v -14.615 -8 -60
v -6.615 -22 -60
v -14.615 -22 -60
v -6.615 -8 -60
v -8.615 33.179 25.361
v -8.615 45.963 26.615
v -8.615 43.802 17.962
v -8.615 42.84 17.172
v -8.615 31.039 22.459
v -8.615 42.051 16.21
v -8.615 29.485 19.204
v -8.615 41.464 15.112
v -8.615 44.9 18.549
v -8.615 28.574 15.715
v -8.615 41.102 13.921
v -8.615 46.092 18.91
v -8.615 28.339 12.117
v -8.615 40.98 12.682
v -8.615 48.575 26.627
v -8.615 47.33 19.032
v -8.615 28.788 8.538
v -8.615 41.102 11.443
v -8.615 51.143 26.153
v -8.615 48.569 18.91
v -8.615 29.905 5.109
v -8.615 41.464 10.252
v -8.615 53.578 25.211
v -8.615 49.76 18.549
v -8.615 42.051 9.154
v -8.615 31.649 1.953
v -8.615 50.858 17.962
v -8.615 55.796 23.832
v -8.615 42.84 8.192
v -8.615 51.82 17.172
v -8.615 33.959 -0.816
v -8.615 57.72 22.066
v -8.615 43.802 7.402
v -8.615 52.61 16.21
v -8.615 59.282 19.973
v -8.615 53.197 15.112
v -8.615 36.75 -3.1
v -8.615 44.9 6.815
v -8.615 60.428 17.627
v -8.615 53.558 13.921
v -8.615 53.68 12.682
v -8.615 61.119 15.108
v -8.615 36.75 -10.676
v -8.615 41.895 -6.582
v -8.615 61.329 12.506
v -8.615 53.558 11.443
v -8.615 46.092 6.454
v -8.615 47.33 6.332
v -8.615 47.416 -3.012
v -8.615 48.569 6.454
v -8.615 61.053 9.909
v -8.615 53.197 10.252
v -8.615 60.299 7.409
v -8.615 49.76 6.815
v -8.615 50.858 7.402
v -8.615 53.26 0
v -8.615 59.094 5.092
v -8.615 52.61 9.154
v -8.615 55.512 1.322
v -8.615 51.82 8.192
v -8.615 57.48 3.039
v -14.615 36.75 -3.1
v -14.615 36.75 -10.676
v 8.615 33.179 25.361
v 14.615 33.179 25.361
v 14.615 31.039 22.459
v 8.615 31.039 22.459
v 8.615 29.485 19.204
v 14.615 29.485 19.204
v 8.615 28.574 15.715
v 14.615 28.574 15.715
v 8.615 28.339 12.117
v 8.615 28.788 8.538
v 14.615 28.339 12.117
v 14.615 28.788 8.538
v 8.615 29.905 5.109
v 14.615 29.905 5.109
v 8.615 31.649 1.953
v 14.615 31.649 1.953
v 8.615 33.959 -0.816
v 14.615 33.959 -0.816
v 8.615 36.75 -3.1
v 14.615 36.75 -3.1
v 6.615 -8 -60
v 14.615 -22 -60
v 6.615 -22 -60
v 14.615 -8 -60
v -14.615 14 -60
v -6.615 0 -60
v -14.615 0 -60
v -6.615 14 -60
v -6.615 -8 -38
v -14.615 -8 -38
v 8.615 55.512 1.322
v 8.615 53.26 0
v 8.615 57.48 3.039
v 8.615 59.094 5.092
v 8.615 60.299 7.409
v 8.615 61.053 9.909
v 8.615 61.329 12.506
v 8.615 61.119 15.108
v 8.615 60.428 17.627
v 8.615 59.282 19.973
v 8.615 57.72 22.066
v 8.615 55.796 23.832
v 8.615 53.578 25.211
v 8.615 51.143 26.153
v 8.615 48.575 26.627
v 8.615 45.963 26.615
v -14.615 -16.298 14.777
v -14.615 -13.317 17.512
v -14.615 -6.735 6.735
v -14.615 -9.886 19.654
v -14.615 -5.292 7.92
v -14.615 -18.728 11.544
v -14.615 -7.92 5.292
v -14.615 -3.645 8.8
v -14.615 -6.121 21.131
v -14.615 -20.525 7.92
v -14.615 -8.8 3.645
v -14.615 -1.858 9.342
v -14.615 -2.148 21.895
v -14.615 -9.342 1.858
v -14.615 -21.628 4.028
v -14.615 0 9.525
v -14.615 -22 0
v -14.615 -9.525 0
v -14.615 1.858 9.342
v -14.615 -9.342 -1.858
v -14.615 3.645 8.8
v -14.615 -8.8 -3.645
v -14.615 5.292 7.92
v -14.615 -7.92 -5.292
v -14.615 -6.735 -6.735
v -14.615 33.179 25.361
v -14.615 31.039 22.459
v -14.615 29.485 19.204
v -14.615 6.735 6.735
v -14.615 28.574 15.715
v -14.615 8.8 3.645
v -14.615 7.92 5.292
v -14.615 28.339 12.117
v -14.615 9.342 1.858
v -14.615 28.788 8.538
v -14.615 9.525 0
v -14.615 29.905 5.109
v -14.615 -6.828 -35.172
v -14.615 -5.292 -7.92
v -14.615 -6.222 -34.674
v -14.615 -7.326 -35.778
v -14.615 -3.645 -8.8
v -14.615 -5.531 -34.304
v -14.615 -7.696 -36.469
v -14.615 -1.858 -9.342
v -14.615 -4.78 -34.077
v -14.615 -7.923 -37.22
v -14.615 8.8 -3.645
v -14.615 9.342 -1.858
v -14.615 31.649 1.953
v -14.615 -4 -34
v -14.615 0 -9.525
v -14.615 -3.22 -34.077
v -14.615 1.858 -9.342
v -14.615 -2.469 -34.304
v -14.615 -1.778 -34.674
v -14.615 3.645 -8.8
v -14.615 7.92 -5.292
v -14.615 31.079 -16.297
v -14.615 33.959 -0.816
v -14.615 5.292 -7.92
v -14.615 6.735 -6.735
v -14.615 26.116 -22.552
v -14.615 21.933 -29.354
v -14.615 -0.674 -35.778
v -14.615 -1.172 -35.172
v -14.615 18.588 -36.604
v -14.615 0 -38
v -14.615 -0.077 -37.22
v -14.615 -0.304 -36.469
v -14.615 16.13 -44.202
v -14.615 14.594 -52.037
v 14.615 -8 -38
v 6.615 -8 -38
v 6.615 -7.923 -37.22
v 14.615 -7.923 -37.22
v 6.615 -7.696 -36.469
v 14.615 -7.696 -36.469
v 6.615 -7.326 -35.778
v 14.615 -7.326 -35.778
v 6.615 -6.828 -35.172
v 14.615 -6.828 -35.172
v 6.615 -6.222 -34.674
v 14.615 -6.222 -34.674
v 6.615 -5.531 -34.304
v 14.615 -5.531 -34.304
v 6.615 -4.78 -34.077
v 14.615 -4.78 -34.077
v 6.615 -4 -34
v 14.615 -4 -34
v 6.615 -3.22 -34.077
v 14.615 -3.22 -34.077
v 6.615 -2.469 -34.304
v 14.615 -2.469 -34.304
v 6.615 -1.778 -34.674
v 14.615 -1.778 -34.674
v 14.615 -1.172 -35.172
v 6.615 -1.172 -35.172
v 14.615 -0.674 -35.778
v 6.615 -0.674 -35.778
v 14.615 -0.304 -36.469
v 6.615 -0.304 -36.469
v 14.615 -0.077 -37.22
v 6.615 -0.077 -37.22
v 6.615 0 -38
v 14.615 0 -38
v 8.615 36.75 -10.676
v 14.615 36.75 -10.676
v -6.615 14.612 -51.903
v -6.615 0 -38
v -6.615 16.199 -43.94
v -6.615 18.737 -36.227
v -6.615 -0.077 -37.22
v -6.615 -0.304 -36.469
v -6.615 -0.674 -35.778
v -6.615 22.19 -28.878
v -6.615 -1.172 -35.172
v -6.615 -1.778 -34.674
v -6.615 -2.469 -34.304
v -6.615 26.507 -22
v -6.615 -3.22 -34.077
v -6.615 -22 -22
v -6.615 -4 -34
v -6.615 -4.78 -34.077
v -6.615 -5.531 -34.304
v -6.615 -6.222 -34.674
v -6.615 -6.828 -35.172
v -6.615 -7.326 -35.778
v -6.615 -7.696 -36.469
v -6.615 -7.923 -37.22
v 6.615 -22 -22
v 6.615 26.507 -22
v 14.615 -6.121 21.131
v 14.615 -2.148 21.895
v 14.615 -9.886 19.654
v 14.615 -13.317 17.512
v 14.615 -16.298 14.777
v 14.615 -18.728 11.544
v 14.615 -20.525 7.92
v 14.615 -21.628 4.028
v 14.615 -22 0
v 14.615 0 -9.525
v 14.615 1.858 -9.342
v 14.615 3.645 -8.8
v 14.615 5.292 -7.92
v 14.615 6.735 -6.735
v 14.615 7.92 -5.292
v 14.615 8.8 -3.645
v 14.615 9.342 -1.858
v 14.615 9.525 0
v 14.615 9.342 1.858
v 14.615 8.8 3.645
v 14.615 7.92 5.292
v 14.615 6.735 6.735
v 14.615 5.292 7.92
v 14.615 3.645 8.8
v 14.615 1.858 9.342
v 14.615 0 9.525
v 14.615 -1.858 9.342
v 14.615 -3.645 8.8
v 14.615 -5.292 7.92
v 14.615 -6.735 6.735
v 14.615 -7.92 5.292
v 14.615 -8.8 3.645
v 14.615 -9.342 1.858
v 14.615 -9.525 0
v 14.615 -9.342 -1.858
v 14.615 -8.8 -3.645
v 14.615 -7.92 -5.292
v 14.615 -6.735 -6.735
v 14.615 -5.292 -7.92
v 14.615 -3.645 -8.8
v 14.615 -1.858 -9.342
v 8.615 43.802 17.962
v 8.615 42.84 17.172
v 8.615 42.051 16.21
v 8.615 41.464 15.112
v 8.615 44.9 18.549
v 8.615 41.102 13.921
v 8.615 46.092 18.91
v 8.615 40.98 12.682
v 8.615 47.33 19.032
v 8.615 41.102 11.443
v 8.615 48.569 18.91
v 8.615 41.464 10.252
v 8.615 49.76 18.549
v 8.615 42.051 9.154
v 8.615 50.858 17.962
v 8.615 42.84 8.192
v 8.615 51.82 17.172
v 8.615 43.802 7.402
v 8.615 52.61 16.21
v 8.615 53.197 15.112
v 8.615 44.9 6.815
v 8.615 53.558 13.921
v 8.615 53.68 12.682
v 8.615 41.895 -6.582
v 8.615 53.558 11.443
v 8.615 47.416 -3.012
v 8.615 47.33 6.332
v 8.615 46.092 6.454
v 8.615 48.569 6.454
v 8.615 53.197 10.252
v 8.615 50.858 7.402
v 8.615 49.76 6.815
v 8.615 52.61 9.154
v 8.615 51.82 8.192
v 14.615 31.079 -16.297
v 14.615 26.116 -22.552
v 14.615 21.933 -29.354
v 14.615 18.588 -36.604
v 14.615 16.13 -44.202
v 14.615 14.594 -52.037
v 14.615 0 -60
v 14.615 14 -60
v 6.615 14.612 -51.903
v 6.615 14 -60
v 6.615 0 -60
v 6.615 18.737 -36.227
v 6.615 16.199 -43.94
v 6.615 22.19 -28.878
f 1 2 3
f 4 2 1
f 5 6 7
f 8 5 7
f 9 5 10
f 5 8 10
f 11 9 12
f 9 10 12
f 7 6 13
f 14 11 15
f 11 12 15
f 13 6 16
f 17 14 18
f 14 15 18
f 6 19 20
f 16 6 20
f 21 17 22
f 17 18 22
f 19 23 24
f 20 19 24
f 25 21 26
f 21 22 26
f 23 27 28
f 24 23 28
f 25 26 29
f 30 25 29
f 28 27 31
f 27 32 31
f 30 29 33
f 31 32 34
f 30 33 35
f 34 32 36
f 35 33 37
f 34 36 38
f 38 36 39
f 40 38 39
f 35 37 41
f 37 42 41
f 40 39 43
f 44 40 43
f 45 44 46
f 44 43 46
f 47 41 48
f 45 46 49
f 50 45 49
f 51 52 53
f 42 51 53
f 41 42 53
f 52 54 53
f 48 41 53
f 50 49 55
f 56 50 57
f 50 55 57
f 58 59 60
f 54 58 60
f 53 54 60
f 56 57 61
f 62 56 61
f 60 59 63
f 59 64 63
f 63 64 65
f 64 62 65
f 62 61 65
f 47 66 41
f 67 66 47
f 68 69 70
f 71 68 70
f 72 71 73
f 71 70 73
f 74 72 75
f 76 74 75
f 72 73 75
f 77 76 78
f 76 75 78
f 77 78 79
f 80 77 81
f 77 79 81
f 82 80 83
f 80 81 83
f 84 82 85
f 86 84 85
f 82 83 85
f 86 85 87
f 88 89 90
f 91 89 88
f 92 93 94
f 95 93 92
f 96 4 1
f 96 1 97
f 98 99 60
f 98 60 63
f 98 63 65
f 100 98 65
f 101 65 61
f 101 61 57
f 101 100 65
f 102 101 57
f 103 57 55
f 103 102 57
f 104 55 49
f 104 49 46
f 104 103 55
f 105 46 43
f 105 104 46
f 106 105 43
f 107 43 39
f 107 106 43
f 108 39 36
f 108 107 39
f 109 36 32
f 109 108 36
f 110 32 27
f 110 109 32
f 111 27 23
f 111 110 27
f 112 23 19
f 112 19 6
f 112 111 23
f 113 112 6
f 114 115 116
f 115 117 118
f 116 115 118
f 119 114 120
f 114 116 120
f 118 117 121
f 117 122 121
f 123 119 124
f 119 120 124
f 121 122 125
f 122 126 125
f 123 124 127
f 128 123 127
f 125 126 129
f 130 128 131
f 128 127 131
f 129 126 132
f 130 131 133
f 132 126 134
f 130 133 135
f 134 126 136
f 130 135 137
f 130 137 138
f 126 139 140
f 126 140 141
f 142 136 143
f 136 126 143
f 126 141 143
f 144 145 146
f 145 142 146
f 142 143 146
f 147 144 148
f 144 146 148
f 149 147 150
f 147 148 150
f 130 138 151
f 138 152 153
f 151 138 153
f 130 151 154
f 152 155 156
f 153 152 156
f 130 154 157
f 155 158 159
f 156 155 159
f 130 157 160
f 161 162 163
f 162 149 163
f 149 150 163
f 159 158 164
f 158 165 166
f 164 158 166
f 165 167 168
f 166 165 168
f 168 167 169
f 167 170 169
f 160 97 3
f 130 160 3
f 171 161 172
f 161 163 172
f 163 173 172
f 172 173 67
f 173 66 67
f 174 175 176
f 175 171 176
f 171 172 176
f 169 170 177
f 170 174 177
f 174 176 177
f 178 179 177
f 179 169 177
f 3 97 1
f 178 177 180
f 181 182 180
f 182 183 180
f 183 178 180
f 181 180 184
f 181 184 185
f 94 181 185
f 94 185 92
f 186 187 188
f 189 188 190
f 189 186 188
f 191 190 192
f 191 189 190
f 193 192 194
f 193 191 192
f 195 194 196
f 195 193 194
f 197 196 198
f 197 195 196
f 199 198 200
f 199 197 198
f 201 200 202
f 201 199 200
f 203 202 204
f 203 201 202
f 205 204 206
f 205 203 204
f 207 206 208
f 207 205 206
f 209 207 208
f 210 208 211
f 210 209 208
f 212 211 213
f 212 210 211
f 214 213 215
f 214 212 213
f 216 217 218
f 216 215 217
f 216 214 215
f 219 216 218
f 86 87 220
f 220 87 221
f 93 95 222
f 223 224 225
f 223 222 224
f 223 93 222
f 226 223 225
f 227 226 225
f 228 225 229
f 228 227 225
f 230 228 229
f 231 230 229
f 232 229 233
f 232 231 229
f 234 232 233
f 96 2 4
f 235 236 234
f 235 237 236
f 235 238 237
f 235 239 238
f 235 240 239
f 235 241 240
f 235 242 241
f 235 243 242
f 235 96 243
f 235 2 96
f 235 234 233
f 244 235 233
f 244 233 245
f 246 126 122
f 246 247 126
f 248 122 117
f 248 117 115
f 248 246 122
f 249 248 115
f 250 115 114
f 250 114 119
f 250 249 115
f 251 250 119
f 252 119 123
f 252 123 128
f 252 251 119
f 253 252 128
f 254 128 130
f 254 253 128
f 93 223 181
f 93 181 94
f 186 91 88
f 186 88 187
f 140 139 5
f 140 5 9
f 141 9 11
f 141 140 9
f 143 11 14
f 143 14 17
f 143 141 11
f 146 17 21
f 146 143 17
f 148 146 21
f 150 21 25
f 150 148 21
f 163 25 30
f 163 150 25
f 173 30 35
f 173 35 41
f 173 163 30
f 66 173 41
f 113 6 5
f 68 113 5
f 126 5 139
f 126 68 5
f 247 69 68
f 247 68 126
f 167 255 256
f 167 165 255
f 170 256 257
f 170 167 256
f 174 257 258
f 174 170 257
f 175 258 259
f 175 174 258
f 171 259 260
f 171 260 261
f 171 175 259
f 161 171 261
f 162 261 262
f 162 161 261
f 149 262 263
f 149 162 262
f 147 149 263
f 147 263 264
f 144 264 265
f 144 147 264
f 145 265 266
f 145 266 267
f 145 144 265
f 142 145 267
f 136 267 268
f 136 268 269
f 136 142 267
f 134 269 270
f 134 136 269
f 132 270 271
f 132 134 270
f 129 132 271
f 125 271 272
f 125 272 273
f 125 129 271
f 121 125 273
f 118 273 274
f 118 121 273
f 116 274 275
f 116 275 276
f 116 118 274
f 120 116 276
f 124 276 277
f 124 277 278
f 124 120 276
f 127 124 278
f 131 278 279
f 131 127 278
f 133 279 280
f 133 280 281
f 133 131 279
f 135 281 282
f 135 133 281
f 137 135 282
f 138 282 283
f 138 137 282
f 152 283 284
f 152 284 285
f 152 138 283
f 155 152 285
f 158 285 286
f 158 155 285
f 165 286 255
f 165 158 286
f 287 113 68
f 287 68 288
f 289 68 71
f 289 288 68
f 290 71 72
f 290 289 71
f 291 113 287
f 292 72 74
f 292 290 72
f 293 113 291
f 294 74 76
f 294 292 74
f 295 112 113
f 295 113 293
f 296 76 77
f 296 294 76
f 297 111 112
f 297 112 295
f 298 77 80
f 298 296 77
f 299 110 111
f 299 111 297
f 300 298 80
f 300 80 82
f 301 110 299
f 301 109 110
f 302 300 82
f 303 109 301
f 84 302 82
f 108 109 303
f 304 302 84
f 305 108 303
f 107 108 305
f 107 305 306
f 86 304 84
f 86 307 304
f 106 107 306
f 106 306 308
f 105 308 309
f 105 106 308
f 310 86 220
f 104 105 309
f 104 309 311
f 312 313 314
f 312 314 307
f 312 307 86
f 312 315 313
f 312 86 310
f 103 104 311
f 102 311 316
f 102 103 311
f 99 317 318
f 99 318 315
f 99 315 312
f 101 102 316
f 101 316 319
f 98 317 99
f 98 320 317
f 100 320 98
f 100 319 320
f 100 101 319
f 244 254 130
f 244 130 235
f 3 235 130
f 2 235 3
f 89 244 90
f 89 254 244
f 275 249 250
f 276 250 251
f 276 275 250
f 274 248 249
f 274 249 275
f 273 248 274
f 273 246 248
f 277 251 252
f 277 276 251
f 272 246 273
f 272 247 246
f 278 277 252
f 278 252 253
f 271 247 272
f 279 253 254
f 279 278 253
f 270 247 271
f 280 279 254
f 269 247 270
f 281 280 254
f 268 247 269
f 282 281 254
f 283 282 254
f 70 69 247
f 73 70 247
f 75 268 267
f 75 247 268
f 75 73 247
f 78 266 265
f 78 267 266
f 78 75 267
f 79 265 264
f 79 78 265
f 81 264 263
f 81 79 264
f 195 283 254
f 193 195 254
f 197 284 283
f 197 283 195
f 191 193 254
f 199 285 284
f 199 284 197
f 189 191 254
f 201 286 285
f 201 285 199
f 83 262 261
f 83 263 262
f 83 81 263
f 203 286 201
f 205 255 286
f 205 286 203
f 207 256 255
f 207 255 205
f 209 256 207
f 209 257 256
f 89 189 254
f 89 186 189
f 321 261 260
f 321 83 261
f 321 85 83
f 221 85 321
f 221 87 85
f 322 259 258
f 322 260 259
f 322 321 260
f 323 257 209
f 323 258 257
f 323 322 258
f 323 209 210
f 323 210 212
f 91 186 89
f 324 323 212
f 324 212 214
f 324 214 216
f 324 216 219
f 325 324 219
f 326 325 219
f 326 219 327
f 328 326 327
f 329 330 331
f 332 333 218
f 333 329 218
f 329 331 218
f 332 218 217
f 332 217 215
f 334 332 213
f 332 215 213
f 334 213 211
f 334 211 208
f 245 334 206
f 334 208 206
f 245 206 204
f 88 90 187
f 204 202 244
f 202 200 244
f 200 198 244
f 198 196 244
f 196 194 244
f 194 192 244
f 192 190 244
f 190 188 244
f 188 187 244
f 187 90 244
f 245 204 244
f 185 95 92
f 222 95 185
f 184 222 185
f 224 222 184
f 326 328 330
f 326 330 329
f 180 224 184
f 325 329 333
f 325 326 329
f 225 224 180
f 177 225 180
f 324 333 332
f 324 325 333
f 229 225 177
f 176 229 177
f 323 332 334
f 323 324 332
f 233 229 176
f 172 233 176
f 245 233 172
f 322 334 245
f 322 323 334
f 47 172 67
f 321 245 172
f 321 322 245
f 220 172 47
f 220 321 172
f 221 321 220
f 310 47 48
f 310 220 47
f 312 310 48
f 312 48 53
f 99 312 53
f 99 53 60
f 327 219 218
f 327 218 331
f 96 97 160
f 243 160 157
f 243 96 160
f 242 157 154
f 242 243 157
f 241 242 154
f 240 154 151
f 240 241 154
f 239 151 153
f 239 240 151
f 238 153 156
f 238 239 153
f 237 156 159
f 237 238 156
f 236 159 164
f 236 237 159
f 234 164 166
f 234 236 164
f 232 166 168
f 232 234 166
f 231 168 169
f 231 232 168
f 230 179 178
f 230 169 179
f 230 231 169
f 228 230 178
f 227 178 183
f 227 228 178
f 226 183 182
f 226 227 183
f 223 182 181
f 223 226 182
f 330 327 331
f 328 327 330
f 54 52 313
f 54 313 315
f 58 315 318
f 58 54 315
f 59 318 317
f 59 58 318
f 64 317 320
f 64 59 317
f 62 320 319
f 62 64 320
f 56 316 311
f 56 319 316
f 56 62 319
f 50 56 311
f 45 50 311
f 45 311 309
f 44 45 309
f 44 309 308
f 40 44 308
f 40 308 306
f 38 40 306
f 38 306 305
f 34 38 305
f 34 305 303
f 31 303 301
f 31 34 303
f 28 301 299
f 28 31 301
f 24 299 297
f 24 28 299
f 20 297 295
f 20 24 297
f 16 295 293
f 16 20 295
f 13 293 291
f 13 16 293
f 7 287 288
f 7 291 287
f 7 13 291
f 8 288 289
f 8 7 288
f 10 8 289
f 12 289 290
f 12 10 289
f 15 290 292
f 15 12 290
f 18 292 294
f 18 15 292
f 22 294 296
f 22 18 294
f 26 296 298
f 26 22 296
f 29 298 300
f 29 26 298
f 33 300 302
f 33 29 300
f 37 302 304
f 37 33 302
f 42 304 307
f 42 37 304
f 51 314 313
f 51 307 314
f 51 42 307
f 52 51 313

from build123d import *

# Parameters (mm, degrees)
SKETCH1_R           = 6.35
SKETCH1_R_2         = 9.525
BOSS_EXTRUDE1_DEPTH = 14.615
CUT_EXTRUDE1_DEPTH  = 91.641086881
SKETCH4_W           = 13.23
SKETCH4_H           = 38
CUT_EXTRUDE2_DEPTH  = 104.718600248
CUT_EXTRUDE3_DEPTH  = 6


with BuildPart() as part:
    # Sketch1 → Boss-Extrude1 (new, symmetric)
    with BuildSketch(Plane(origin=(0, 0, 0), x_dir=(0, 0, -1), z_dir=(1, 0, 0))):
        with BuildLine():
            Line((0, -22), (60, -22))
            Line((60, -22), (60, 14))
            ThreePointArc((60, 14), (24.306087072, 24.928324713), (0, 53.260247211))
            ThreePointArc((0, 53.260247211), (-16.383810232, 60.832127863), (-26.61523279, 45.963348263))
            Line((-26.61523279, 45.963348263), (-21.894870769, -2.148169925))
            ThreePointArc((-21.894870769, -2.148169925), (-14.777351956, -16.298155392), (0, -22))
        make_face()
        with Locations((-12.68213321, 47.330365488)):
            Circle(SKETCH1_R, mode=Mode.SUBTRACT)
        Circle(SKETCH1_R_2, mode=Mode.SUBTRACT)
    extrude(amount=BOSS_EXTRUDE1_DEPTH, both=True)

    # Sketch2 → Cut-Extrude1 (cut, through all)
    with BuildSketch(Plane(origin=(14.615, 0, 0), x_dir=(0, 0, -1), z_dir=(1, 0, 0))):
        with BuildLine():
            Line((38, 0), (60, 0))
            ThreePointArc((60, 0), (64, -4), (60, -8))
            Line((60, -8), (38, -8))
            ThreePointArc((38, -8), (34, -4), (38, 0))
        make_face()
    extrude(amount=-CUT_EXTRUDE1_DEPTH, mode=Mode.SUBTRACT)

    # Sketch4 → Cut-Extrude2 (cut, through all)
    with BuildSketch(Plane.XZ.offset(22)):
        with Locations((0, -41)):
            Rectangle(SKETCH4_W, SKETCH4_H)
    extrude(amount=-CUT_EXTRUDE2_DEPTH, mode=Mode.SUBTRACT)

    # Sketch5 → Cut-Extrude3 (cut)
    with BuildSketch(Plane(origin=(14.615, 0, 0), x_dir=(0, 0, -1), z_dir=(1, 0, 0))):
        with BuildLine():
            Line((3.099615742, 36.750365488), (10.675895531, 36.750365488))
            ThreePointArc((10.675895531, 36.750365488), (4.729057579, 44.611575605), (0, 53.260247211))
            ThreePointArc((0, 53.260247211), (-16.383810232, 60.832127863), (-26.61523279, 45.963348263))
            Line((-26.61523279, 45.963348263), (-25.360971776, 33.179497931))
            ThreePointArc((-25.360971776, 33.179497931), (-10.316803002, 28.478171637), (3.099615742, 36.750365488))
        make_face()
    cut_extrude3 = extrude(amount=-CUT_EXTRUDE3_DEPTH, mode=Mode.SUBTRACT)

    # Mirror1: Cut-Extrude3 across plane
    add(cut_extrude3.mirror(Plane(origin=(0, 0, 0), x_dir=(0, 0, 1), z_dir=(1, 0, 0))), mode=Mode.SUBTRACT)


solid = part.part
